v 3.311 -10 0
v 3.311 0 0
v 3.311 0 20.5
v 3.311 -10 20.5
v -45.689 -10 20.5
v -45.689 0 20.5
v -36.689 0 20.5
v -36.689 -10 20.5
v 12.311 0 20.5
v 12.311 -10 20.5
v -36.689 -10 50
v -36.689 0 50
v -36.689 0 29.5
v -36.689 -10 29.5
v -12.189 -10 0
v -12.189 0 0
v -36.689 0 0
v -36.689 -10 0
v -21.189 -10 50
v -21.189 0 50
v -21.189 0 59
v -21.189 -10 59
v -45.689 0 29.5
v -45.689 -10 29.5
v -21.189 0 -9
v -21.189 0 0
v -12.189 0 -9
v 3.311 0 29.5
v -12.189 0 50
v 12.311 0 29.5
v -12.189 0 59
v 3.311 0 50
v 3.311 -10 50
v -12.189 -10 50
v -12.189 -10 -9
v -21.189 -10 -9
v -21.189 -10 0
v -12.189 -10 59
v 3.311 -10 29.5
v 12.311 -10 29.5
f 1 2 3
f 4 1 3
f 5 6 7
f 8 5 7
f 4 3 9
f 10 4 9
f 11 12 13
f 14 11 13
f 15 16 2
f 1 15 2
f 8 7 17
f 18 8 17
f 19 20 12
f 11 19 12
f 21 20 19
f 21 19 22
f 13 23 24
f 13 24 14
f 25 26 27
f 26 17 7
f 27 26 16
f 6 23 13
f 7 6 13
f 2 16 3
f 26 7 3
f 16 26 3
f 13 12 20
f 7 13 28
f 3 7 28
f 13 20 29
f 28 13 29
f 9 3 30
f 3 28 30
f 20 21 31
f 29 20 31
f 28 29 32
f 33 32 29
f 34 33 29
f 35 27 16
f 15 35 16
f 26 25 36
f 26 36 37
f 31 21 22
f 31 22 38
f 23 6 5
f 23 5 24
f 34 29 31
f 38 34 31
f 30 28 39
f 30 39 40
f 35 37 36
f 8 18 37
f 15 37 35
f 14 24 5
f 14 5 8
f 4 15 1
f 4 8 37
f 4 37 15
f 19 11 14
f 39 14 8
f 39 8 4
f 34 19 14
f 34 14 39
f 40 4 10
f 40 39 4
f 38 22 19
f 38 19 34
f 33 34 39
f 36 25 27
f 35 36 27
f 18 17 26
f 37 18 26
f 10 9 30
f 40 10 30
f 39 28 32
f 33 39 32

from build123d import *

# Parameters (mm, degrees)
F0_W     = 9
F0_H     = 9
F1_DEPTH = 10


with BuildPart() as f1:
    # F0 (on Front) → F1 (new body)
    with BuildSketch(Plane.XZ):
        Polygon((-21.18931, 50), (-36.68931, 50), (-36.68931, 29.5), (-36.68931, 20.5), (-36.68931, 0), (-21.18931, 0), (-12.18931, 0), (3.31069, 0), (3.31069, 20.5), (3.31069, 29.5), (3.31069, 50), (-12.18931, 50), align=None)
        with Locations((-16.68931, 54.5)):
            Rectangle(F0_W, F0_H)
        with Locations((-41.18931, 25)):
            Rectangle(F0_W, F0_H)
        with Locations((7.81069, 25)):
            Rectangle(F0_W, F0_H)
        with Locations((-16.68931, -4.5)):
            Rectangle(F0_W, F0_H)
    extrude(amount=F1_DEPTH)


solid = f1.part
